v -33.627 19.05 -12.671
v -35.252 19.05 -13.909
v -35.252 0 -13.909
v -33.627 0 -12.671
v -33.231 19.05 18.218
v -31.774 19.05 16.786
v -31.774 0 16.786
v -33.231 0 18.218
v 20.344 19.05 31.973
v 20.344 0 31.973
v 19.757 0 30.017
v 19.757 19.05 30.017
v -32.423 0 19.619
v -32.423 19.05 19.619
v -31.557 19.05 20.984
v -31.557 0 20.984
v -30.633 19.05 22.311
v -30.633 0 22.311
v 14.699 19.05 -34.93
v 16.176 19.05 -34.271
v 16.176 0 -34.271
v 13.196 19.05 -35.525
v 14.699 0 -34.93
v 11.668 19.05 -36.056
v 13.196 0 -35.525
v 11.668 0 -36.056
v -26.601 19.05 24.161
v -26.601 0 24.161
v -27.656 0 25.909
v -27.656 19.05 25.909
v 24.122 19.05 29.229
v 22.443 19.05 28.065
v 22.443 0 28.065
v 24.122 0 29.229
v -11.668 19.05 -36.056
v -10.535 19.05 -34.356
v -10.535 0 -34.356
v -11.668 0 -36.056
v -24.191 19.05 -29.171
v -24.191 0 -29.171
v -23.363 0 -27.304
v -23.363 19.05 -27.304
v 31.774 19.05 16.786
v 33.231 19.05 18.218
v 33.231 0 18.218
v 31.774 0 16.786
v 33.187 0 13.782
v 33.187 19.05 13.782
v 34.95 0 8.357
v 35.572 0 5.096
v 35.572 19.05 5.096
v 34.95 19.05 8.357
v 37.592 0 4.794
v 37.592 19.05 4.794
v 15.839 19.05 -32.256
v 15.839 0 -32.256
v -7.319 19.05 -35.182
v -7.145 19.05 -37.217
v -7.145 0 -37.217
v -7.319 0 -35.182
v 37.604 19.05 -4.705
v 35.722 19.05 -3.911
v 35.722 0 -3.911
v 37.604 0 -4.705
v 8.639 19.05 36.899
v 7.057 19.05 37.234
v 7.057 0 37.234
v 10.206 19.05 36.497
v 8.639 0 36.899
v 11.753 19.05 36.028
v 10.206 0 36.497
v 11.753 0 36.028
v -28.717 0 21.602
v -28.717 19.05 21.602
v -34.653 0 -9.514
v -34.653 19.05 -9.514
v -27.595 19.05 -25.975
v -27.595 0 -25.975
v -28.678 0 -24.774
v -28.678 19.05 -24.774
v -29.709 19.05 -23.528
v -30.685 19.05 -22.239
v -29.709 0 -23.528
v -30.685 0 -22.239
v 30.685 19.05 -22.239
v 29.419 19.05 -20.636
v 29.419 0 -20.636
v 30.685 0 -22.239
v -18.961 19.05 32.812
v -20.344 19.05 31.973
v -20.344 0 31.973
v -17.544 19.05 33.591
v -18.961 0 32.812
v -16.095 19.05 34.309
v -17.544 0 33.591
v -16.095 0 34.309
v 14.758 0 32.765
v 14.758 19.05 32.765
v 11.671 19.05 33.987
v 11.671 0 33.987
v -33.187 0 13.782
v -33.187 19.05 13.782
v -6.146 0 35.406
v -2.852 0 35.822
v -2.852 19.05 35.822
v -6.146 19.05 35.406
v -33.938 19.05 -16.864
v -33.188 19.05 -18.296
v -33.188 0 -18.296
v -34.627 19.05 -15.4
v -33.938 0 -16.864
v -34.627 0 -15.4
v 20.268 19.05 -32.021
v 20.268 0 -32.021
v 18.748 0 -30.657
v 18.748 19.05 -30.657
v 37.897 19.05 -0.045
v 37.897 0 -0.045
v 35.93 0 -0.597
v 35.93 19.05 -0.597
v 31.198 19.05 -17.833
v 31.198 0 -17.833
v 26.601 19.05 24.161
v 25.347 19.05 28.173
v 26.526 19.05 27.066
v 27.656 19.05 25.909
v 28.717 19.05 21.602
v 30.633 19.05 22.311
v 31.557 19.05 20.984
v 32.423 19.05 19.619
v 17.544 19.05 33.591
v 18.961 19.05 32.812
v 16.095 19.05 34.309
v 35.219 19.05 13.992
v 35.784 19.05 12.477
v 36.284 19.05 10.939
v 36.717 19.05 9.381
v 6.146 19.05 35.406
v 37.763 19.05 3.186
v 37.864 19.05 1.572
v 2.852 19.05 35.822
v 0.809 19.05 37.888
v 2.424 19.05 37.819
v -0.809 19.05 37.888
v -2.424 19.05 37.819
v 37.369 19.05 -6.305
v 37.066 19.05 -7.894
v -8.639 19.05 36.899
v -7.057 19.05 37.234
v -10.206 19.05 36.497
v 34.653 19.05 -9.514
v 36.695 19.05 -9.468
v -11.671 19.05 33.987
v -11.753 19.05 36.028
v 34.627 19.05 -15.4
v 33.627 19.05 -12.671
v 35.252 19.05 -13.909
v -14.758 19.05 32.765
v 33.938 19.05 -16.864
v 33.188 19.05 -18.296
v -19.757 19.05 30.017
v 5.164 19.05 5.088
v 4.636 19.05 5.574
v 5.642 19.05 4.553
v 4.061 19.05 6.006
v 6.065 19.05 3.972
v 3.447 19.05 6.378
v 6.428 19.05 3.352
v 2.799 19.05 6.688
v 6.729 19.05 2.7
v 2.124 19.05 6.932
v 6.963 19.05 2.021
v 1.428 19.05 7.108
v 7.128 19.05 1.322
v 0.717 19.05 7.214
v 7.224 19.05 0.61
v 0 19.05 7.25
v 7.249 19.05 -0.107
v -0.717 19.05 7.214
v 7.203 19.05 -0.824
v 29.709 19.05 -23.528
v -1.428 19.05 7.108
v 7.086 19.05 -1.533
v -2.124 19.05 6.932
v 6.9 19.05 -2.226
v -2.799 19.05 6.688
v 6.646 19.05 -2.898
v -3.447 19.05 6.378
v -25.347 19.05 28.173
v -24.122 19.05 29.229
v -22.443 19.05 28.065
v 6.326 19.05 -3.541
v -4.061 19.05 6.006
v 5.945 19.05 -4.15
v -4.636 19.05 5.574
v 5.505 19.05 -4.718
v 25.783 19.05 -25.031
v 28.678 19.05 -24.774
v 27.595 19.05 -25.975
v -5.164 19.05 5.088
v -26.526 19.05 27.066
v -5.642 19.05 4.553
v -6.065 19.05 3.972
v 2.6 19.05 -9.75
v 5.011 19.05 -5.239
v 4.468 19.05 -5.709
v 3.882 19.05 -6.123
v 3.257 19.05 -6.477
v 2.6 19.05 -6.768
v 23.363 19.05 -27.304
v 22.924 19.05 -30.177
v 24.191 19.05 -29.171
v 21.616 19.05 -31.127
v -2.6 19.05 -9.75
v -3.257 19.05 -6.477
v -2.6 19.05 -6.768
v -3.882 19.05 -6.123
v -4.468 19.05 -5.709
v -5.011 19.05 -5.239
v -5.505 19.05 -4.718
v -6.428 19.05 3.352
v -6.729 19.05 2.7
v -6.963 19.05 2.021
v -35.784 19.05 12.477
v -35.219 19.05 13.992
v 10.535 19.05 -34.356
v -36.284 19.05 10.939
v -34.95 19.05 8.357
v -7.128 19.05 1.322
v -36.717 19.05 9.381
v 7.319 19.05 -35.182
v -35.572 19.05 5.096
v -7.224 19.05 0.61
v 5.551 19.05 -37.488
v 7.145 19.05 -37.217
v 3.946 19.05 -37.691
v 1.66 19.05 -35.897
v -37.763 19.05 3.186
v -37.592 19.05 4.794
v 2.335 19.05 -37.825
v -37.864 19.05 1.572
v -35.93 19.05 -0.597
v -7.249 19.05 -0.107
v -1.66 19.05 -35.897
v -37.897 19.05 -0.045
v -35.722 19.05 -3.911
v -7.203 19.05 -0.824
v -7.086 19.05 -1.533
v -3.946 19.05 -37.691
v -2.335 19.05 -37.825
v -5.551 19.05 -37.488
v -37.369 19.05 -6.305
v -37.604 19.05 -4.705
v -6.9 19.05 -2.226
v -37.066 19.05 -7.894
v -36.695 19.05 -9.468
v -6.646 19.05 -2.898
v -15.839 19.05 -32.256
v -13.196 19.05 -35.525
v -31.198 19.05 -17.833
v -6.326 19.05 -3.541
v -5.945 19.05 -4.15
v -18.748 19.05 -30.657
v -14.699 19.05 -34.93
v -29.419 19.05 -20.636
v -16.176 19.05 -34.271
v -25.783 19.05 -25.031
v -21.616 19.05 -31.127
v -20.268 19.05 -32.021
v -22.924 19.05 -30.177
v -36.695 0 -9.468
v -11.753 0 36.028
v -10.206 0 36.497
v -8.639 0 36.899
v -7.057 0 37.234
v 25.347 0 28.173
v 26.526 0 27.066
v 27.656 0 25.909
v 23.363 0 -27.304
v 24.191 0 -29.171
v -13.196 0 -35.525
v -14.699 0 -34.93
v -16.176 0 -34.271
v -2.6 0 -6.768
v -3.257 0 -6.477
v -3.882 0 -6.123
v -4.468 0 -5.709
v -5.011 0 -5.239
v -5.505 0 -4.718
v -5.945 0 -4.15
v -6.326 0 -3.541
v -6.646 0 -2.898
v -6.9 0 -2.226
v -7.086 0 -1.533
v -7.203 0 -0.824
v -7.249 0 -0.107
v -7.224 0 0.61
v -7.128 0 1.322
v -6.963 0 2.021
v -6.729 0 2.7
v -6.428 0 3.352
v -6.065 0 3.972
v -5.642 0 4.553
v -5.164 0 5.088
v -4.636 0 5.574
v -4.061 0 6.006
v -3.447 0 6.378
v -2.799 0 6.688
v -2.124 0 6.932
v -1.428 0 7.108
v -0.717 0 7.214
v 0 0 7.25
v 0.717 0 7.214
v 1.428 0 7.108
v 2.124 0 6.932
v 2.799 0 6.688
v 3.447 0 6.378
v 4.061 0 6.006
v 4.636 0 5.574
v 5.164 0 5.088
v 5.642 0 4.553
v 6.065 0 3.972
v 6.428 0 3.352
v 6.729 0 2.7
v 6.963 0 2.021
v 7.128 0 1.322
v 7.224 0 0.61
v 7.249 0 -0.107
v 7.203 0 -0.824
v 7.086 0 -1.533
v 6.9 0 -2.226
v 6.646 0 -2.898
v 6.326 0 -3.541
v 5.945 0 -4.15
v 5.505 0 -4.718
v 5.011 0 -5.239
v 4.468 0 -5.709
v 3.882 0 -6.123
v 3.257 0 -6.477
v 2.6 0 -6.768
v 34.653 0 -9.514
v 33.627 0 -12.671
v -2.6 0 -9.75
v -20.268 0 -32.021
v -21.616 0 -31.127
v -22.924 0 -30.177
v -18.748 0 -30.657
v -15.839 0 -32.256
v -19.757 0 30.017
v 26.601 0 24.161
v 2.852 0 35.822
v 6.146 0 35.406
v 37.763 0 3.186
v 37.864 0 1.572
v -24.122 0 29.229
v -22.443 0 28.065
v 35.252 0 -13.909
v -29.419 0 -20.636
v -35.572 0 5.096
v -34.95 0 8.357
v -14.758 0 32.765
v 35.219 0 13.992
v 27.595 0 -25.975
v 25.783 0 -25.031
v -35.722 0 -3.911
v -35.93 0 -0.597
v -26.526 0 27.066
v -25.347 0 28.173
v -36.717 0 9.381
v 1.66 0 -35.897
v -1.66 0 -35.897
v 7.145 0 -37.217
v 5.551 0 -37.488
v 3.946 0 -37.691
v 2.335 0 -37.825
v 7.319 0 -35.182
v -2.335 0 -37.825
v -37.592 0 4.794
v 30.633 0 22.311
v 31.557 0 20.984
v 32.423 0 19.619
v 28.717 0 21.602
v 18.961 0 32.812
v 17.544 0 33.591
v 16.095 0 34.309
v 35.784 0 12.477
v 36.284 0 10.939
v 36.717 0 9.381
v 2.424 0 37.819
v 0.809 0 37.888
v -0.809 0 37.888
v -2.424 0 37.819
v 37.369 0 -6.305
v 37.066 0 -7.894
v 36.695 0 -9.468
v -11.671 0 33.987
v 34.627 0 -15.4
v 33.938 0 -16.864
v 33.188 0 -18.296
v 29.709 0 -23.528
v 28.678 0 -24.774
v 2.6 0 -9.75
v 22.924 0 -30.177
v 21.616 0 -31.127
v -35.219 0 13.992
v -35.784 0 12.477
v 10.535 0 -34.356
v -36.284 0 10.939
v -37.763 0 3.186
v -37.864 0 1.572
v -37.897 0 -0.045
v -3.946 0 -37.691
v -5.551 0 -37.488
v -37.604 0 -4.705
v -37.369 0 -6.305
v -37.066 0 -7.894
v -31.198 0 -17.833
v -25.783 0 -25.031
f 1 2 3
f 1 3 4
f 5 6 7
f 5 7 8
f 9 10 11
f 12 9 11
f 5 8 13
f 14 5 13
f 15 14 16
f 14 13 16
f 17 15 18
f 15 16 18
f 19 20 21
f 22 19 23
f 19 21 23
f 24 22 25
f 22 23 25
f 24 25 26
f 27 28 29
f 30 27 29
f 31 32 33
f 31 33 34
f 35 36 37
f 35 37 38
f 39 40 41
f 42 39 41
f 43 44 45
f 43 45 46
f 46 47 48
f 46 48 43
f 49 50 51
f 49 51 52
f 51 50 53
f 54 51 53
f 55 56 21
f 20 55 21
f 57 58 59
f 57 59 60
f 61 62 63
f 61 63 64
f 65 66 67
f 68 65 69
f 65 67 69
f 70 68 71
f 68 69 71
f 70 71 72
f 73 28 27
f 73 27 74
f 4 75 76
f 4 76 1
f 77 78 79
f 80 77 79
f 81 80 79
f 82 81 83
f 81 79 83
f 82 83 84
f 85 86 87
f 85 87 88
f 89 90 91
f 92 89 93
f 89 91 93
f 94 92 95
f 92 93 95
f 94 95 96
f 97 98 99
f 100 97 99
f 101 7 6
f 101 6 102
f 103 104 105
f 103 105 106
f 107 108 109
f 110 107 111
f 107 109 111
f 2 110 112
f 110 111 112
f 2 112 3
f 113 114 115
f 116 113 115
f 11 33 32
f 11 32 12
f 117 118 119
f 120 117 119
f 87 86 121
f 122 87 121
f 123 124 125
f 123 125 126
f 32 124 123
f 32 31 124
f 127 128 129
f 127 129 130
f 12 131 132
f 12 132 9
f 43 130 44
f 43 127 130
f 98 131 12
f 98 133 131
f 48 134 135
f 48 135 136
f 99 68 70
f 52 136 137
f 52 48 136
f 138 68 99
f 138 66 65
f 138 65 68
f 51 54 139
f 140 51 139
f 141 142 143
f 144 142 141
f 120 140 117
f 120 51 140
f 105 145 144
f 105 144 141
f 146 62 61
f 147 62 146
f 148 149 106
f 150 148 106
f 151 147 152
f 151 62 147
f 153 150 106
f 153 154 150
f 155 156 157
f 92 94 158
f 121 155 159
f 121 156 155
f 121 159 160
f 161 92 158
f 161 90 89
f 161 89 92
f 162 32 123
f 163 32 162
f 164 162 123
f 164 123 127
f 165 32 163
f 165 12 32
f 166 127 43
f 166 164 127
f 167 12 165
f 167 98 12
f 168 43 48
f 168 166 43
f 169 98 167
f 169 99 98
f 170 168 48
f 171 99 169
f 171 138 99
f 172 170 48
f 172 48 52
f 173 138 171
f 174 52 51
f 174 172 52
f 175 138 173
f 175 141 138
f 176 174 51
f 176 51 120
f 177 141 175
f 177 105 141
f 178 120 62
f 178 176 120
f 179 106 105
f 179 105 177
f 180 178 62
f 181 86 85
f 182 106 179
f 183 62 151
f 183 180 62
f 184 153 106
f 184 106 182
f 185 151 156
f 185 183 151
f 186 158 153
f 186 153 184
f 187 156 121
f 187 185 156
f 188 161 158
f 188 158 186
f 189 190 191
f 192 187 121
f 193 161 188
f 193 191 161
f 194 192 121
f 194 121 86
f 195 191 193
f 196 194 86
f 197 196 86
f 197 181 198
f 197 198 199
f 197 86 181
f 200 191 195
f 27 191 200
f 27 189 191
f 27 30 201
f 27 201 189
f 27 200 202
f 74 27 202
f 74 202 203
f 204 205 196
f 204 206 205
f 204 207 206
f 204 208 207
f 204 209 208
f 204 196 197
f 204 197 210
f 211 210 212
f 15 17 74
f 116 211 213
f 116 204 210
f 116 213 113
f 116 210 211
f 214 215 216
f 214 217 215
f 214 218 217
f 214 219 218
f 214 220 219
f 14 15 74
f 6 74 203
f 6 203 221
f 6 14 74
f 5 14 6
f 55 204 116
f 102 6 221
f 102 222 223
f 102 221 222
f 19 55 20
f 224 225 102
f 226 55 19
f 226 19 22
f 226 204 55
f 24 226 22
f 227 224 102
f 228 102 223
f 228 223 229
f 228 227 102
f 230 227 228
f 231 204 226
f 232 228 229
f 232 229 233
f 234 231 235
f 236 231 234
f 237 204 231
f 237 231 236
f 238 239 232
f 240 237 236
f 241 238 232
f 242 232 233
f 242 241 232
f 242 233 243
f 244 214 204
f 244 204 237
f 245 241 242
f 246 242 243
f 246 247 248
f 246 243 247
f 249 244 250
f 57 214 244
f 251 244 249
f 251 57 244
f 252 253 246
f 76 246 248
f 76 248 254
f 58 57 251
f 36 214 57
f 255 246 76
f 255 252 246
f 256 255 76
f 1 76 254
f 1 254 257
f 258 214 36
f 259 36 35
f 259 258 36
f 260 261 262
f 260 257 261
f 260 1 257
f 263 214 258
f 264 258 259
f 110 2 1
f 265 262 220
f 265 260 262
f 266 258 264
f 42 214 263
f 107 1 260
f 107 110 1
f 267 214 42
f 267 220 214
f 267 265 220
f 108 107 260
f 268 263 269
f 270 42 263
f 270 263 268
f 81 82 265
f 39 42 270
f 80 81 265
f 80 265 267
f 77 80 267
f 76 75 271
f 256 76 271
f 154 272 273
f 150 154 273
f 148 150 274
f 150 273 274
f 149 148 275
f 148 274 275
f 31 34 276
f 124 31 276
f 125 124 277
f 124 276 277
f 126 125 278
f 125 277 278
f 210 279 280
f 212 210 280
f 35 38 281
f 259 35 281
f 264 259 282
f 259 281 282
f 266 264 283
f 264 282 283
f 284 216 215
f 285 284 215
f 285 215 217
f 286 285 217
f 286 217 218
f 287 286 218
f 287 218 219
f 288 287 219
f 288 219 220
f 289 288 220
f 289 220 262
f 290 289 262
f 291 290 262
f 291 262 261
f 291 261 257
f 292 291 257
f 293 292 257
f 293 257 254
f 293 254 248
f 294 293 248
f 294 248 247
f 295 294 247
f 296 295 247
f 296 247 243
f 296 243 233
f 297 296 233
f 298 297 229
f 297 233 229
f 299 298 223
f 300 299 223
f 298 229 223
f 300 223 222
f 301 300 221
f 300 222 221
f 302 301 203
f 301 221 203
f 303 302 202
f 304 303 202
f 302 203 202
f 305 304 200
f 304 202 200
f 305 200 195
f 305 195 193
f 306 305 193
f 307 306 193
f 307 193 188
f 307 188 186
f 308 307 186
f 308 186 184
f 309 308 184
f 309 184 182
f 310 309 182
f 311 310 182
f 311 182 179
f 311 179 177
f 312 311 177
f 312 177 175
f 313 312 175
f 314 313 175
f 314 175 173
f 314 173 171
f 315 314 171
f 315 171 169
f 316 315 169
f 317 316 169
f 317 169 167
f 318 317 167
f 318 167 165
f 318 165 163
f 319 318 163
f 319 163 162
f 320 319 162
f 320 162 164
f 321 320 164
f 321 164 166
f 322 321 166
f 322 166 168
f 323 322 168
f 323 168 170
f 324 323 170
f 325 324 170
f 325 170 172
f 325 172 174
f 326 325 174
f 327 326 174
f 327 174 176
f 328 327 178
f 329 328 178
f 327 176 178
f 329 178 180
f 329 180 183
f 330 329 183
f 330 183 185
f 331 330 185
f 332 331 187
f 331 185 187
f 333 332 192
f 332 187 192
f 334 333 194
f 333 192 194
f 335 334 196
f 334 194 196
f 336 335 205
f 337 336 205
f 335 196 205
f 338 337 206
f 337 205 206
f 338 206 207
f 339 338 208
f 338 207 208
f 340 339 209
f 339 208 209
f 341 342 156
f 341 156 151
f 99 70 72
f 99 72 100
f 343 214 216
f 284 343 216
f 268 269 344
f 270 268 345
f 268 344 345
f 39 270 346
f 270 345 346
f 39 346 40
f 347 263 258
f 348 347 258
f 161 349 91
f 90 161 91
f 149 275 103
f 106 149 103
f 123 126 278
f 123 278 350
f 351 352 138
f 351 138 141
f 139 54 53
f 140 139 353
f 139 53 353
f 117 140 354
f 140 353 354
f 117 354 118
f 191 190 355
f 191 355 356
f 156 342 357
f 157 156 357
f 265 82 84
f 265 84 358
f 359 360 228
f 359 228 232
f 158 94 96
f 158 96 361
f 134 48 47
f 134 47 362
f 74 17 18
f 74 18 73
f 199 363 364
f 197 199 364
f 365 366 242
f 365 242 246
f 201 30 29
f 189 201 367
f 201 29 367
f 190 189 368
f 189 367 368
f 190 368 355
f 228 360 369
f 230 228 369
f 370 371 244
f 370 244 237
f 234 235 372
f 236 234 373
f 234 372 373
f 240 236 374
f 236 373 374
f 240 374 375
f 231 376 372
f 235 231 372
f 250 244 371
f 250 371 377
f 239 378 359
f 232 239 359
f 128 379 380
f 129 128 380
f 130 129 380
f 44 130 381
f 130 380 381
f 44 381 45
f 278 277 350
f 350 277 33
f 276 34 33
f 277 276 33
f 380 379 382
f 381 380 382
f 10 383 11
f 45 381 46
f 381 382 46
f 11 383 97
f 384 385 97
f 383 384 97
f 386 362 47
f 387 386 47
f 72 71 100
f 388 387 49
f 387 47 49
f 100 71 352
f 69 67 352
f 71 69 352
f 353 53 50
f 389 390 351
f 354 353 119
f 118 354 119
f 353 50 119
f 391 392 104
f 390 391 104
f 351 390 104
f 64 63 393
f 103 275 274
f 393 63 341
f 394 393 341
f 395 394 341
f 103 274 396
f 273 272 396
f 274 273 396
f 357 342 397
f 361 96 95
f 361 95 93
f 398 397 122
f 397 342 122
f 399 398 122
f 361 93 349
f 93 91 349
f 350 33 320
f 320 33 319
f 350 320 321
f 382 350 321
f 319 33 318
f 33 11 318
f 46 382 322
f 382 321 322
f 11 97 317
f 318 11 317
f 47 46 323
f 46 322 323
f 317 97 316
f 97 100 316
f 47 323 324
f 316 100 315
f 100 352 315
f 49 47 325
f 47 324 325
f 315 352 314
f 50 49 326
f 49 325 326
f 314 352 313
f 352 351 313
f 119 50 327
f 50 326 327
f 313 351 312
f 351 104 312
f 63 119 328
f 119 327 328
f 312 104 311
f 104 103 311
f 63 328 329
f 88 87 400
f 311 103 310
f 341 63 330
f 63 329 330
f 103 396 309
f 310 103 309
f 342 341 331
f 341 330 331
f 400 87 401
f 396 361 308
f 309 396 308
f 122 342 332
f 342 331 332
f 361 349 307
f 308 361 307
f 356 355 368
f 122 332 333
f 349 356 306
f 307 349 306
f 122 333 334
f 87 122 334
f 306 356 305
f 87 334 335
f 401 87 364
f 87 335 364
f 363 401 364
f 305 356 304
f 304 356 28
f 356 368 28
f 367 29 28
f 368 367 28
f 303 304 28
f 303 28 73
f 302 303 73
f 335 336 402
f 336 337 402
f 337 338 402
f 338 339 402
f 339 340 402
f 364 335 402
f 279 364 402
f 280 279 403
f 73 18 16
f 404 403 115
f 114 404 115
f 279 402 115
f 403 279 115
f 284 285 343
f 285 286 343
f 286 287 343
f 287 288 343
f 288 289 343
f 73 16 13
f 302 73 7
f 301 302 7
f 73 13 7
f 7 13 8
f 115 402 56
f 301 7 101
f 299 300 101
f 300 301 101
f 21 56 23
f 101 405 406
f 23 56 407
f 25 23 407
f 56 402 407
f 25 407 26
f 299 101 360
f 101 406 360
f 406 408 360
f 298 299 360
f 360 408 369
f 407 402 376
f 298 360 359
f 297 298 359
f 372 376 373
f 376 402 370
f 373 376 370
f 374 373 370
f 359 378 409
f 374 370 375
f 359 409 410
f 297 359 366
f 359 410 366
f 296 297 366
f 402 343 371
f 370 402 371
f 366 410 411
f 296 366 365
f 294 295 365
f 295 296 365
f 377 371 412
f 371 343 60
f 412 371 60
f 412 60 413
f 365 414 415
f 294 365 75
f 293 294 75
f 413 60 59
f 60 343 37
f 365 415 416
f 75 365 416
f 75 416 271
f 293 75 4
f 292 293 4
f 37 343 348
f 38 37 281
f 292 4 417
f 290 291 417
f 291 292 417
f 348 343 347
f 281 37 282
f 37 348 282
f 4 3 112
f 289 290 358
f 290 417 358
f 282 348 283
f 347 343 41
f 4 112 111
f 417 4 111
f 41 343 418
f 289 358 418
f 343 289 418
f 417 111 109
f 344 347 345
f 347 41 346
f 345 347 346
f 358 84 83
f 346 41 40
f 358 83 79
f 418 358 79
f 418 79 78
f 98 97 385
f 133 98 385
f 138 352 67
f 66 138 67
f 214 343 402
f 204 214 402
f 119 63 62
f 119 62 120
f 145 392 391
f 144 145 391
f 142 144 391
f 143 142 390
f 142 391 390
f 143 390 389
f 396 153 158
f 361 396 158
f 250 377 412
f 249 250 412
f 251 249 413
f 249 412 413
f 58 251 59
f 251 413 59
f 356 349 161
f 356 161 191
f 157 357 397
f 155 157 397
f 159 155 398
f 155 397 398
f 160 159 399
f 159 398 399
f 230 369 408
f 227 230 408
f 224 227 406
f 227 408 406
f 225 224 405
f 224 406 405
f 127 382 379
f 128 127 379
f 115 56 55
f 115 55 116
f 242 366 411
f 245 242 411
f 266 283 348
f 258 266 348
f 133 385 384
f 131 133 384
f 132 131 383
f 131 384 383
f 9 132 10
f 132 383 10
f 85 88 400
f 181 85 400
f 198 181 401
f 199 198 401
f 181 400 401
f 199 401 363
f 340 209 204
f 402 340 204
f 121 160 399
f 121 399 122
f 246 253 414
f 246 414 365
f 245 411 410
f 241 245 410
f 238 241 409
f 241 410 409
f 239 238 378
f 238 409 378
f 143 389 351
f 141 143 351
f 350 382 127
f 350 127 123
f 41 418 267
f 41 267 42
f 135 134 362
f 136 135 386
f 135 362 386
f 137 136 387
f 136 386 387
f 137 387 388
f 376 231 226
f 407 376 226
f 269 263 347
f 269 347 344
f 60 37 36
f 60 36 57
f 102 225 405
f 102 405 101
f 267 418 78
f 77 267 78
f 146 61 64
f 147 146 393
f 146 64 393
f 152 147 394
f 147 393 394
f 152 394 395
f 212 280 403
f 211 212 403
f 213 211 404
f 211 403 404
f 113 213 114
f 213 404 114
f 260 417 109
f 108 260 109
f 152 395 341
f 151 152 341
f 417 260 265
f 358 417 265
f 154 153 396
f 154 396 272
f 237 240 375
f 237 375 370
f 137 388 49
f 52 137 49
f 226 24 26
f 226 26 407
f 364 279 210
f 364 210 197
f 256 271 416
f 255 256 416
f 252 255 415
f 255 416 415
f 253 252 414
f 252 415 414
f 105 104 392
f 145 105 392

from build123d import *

# Parameters (mm, degrees)
SKETCH5_R           = 37.8968
BOSS_EXTRUDE2_DEPTH = 19.05
CUT_EXTRUDE1_DEPTH  = 22.05
CIRPATTERN1_COUNT   = 25
SKETCH9_R           = 7.25
CUT_EXTRUDE2_DEPTH  = 25.4


with BuildPart() as part:
    # Sketch5 → Boss-Extrude2 (new body)
    with BuildSketch(Plane(origin=(0, 0, 0), x_dir=(1, 0, 0), z_dir=(0, 1, 0))):
        with Locations(Location((0, 0, 0), (0, 0, 90))):
            Circle(SKETCH5_R)
    extrude(amount=BOSS_EXTRUDE2_DEPTH)

    # Sketch8 → Cut-Extrude1 (cut)
    with BuildSketch(Plane(origin=(0, 19.05, 0), x_dir=(1, 0, 0), z_dir=(0, 1, 0))):
        Polygon((0, 37.8968), (2.36, 37.8968), (1.66, 35.8968), (0, 35.8968), (-1.66, 35.8968), (-2.36, 37.8968), align=None)
    cut_extrude1 = extrude(amount=-CUT_EXTRUDE1_DEPTH, mode=Mode.SUBTRACT)

    # CirPattern1: Cut-Extrude1 ×25 about axis
    cirpattern1_axis = Axis((0, 0, 0), (0, 1, 0))
    for i in range(1, CIRPATTERN1_COUNT):
        add(cut_extrude1.rotate(cirpattern1_axis, i * 360 / CIRPATTERN1_COUNT), mode=Mode.SUBTRACT)

    # Sketch9 → Cut-Extrude2 (cut)
    with BuildSketch(Plane(origin=(0, 19.05, 0), x_dir=(1, 0, 0), z_dir=(0, 1, 0))):
        Circle(SKETCH9_R)
        Polygon((2.6, 9.75), (2.6, 7.25), (0, 7.25), (-2.6, 7.25), (-2.6, 9.75), align=None)
        with BuildLine():
            ThreePointArc((-2.6, 6.767754428), (-1.32217253, 7.128419166), (0, 7.25))
            Line((0, 7.25), (-2.6, 7.25))
            Line((-2.6, 7.25), (-2.6, 6.767754428))
        make_face()
        with BuildLine():
            Line((2.6, 7.25), (0, 7.25))
            ThreePointArc((0, 7.25), (1.32217253, 7.128419166), (2.6, 6.767754428))
            Line((2.6, 6.767754428), (2.6, 7.25))
        make_face()
    extrude(amount=-CUT_EXTRUDE2_DEPTH, mode=Mode.SUBTRACT)


solid = part.part
